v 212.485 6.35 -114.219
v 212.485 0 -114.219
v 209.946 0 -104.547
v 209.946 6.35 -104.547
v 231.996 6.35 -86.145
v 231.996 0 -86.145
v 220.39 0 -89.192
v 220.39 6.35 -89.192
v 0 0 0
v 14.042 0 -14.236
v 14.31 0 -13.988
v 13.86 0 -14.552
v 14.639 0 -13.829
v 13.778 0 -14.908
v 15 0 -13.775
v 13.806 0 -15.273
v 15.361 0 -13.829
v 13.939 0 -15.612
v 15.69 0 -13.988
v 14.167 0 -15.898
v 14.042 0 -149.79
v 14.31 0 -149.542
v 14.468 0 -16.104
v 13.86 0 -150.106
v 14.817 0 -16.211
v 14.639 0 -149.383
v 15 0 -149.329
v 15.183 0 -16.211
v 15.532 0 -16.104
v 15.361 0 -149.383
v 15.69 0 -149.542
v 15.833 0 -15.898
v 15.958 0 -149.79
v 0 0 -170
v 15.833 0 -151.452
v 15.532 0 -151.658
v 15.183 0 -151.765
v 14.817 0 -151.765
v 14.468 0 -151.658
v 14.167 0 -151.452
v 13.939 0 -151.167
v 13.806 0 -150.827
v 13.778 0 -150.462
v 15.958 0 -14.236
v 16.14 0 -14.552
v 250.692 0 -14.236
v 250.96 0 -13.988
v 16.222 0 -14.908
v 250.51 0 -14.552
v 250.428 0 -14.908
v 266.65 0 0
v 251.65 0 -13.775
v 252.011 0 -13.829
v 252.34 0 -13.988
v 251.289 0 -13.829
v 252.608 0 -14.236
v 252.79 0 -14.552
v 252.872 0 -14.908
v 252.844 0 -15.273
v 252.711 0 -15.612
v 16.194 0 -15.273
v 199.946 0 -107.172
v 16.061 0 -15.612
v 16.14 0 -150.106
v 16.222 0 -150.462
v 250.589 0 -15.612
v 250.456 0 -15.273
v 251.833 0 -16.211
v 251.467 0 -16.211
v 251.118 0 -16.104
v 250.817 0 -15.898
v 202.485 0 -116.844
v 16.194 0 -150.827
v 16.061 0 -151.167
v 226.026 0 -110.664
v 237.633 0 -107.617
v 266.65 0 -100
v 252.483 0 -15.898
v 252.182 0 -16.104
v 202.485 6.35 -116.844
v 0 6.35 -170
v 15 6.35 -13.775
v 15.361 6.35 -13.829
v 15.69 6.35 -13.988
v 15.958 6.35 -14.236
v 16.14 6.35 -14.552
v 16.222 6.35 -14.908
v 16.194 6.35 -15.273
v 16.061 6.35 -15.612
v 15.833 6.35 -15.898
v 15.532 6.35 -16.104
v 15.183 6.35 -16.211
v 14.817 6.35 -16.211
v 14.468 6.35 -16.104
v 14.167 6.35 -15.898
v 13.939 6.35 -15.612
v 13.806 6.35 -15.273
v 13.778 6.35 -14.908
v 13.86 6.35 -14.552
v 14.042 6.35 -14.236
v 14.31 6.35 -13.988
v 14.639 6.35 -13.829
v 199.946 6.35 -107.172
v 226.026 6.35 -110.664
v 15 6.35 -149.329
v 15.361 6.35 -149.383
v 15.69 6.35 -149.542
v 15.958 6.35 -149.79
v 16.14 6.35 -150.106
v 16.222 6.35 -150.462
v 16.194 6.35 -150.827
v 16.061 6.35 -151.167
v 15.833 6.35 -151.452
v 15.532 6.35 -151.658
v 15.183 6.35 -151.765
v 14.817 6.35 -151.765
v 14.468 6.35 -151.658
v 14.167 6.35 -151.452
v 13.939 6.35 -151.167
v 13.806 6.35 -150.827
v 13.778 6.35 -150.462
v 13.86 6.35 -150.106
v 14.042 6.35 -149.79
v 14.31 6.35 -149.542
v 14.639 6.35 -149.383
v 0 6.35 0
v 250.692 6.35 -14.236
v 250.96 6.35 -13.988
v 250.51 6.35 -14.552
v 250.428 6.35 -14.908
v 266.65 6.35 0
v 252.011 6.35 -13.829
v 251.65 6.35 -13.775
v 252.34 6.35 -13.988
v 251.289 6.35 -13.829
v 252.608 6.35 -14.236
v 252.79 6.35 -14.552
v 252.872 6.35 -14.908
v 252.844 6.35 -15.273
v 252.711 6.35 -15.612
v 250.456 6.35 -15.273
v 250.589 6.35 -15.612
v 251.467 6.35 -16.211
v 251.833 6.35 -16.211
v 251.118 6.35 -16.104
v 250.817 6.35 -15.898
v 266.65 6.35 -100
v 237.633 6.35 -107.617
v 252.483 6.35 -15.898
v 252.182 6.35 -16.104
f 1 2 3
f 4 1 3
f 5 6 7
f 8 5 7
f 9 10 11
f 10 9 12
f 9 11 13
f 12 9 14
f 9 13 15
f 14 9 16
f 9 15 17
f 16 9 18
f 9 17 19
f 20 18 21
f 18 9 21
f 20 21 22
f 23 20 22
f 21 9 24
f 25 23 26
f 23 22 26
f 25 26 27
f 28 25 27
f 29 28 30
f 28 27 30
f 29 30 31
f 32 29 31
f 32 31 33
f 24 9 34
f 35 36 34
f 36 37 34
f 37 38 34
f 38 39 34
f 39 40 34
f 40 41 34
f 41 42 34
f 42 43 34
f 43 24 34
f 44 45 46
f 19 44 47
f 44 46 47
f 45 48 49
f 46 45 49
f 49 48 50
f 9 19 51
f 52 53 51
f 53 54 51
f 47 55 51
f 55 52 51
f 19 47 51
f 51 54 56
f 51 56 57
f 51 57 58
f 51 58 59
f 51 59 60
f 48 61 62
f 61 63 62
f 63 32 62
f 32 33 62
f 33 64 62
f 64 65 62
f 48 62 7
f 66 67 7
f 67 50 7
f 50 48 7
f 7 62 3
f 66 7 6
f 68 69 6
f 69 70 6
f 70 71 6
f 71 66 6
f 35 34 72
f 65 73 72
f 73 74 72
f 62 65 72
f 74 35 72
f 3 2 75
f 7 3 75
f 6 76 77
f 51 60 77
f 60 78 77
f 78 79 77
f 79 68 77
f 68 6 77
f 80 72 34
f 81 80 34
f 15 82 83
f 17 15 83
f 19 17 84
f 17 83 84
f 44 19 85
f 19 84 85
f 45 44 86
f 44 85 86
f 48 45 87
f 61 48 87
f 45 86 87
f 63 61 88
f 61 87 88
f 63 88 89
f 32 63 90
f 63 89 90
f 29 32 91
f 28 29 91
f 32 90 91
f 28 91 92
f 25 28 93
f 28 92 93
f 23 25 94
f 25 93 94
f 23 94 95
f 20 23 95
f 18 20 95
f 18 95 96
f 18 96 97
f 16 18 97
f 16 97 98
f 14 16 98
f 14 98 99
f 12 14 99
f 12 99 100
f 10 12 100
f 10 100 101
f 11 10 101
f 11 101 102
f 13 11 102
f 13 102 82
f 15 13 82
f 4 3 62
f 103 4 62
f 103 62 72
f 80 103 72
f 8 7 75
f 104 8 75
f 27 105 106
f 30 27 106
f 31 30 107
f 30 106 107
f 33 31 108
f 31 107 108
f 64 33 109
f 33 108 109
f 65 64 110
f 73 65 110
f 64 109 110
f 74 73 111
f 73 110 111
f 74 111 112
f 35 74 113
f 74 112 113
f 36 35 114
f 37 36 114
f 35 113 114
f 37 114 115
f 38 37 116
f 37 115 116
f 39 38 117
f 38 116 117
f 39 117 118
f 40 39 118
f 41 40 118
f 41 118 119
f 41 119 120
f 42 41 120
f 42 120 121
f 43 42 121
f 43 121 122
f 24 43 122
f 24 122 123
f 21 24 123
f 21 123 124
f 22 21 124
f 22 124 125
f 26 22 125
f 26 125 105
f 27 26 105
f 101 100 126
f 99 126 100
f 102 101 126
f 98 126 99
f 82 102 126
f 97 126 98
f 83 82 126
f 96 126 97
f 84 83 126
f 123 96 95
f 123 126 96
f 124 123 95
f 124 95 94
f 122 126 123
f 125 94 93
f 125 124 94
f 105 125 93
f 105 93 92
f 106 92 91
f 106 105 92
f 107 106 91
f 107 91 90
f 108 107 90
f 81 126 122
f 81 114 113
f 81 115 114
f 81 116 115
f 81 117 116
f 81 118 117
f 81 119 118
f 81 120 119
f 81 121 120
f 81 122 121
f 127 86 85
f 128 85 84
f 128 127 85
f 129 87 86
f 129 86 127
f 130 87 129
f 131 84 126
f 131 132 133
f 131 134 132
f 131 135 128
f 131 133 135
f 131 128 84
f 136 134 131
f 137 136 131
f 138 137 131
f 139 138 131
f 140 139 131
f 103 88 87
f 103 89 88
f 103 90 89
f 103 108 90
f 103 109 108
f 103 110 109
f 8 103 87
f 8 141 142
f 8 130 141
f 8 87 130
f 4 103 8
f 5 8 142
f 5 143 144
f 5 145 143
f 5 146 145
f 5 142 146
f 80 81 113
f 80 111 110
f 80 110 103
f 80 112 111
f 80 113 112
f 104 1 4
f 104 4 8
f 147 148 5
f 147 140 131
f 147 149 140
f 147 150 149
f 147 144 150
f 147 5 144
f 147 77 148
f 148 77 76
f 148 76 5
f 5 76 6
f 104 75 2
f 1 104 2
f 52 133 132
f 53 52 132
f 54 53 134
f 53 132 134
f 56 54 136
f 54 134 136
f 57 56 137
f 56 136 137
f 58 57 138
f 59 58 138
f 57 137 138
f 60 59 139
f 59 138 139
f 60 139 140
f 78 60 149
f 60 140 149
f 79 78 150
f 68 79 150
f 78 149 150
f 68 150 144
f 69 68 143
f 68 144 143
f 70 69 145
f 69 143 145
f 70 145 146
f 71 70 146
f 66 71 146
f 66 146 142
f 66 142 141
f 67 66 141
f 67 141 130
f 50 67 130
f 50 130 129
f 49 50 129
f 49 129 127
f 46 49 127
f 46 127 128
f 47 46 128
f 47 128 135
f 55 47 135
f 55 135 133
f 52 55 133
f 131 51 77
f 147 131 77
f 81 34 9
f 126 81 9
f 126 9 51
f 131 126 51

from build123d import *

# Parameters (mm, degrees)
BOSS_EXTRUDE1_DEPTH = 6.35
SKETCH3_R           = 1.225
CUT_EXTRUDE1_DEPTH  = 317.295028415


with BuildPart() as part:
    # Sketch2 → Boss-Extrude1 (new body)
    with BuildSketch(Plane(origin=(0, 0, 0), x_dir=(1, 0, 0), z_dir=(0, 1, 0))):
        Polygon((0, 0), (266.65, 0), (266.65, 100), (237.633187959, 107.617389248), (231.996319915, 86.144948337), (220.389595099, 89.191904036), (226.026463142, 110.664344947), (212.485284189, 114.219126596), (209.94615444, 104.546855915), (199.94615444, 107.172019988), (202.485284189, 116.844290668), (0, 170), align=None)
    extrude(amount=BOSS_EXTRUDE1_DEPTH)

    # Sketch3 → Cut-Extrude1 (cut, through all)
    with BuildSketch(Plane(origin=(0, 6.35, 0), x_dir=(1, 0, 0), z_dir=(0, 1, 0))):
        with Locations(Location((15, 150.554003041, 0), (0, 0, 270))):
            Circle(SKETCH3_R)
        with Locations(Location((15, 15, 0), (0, 0, 270))):
            Circle(SKETCH3_R)
        with Locations(Location((251.65, 15, 0), (0, 0, 270))):
            Circle(SKETCH3_R)
    extrude(amount=-CUT_EXTRUDE1_DEPTH, mode=Mode.SUBTRACT)


solid = part.part
